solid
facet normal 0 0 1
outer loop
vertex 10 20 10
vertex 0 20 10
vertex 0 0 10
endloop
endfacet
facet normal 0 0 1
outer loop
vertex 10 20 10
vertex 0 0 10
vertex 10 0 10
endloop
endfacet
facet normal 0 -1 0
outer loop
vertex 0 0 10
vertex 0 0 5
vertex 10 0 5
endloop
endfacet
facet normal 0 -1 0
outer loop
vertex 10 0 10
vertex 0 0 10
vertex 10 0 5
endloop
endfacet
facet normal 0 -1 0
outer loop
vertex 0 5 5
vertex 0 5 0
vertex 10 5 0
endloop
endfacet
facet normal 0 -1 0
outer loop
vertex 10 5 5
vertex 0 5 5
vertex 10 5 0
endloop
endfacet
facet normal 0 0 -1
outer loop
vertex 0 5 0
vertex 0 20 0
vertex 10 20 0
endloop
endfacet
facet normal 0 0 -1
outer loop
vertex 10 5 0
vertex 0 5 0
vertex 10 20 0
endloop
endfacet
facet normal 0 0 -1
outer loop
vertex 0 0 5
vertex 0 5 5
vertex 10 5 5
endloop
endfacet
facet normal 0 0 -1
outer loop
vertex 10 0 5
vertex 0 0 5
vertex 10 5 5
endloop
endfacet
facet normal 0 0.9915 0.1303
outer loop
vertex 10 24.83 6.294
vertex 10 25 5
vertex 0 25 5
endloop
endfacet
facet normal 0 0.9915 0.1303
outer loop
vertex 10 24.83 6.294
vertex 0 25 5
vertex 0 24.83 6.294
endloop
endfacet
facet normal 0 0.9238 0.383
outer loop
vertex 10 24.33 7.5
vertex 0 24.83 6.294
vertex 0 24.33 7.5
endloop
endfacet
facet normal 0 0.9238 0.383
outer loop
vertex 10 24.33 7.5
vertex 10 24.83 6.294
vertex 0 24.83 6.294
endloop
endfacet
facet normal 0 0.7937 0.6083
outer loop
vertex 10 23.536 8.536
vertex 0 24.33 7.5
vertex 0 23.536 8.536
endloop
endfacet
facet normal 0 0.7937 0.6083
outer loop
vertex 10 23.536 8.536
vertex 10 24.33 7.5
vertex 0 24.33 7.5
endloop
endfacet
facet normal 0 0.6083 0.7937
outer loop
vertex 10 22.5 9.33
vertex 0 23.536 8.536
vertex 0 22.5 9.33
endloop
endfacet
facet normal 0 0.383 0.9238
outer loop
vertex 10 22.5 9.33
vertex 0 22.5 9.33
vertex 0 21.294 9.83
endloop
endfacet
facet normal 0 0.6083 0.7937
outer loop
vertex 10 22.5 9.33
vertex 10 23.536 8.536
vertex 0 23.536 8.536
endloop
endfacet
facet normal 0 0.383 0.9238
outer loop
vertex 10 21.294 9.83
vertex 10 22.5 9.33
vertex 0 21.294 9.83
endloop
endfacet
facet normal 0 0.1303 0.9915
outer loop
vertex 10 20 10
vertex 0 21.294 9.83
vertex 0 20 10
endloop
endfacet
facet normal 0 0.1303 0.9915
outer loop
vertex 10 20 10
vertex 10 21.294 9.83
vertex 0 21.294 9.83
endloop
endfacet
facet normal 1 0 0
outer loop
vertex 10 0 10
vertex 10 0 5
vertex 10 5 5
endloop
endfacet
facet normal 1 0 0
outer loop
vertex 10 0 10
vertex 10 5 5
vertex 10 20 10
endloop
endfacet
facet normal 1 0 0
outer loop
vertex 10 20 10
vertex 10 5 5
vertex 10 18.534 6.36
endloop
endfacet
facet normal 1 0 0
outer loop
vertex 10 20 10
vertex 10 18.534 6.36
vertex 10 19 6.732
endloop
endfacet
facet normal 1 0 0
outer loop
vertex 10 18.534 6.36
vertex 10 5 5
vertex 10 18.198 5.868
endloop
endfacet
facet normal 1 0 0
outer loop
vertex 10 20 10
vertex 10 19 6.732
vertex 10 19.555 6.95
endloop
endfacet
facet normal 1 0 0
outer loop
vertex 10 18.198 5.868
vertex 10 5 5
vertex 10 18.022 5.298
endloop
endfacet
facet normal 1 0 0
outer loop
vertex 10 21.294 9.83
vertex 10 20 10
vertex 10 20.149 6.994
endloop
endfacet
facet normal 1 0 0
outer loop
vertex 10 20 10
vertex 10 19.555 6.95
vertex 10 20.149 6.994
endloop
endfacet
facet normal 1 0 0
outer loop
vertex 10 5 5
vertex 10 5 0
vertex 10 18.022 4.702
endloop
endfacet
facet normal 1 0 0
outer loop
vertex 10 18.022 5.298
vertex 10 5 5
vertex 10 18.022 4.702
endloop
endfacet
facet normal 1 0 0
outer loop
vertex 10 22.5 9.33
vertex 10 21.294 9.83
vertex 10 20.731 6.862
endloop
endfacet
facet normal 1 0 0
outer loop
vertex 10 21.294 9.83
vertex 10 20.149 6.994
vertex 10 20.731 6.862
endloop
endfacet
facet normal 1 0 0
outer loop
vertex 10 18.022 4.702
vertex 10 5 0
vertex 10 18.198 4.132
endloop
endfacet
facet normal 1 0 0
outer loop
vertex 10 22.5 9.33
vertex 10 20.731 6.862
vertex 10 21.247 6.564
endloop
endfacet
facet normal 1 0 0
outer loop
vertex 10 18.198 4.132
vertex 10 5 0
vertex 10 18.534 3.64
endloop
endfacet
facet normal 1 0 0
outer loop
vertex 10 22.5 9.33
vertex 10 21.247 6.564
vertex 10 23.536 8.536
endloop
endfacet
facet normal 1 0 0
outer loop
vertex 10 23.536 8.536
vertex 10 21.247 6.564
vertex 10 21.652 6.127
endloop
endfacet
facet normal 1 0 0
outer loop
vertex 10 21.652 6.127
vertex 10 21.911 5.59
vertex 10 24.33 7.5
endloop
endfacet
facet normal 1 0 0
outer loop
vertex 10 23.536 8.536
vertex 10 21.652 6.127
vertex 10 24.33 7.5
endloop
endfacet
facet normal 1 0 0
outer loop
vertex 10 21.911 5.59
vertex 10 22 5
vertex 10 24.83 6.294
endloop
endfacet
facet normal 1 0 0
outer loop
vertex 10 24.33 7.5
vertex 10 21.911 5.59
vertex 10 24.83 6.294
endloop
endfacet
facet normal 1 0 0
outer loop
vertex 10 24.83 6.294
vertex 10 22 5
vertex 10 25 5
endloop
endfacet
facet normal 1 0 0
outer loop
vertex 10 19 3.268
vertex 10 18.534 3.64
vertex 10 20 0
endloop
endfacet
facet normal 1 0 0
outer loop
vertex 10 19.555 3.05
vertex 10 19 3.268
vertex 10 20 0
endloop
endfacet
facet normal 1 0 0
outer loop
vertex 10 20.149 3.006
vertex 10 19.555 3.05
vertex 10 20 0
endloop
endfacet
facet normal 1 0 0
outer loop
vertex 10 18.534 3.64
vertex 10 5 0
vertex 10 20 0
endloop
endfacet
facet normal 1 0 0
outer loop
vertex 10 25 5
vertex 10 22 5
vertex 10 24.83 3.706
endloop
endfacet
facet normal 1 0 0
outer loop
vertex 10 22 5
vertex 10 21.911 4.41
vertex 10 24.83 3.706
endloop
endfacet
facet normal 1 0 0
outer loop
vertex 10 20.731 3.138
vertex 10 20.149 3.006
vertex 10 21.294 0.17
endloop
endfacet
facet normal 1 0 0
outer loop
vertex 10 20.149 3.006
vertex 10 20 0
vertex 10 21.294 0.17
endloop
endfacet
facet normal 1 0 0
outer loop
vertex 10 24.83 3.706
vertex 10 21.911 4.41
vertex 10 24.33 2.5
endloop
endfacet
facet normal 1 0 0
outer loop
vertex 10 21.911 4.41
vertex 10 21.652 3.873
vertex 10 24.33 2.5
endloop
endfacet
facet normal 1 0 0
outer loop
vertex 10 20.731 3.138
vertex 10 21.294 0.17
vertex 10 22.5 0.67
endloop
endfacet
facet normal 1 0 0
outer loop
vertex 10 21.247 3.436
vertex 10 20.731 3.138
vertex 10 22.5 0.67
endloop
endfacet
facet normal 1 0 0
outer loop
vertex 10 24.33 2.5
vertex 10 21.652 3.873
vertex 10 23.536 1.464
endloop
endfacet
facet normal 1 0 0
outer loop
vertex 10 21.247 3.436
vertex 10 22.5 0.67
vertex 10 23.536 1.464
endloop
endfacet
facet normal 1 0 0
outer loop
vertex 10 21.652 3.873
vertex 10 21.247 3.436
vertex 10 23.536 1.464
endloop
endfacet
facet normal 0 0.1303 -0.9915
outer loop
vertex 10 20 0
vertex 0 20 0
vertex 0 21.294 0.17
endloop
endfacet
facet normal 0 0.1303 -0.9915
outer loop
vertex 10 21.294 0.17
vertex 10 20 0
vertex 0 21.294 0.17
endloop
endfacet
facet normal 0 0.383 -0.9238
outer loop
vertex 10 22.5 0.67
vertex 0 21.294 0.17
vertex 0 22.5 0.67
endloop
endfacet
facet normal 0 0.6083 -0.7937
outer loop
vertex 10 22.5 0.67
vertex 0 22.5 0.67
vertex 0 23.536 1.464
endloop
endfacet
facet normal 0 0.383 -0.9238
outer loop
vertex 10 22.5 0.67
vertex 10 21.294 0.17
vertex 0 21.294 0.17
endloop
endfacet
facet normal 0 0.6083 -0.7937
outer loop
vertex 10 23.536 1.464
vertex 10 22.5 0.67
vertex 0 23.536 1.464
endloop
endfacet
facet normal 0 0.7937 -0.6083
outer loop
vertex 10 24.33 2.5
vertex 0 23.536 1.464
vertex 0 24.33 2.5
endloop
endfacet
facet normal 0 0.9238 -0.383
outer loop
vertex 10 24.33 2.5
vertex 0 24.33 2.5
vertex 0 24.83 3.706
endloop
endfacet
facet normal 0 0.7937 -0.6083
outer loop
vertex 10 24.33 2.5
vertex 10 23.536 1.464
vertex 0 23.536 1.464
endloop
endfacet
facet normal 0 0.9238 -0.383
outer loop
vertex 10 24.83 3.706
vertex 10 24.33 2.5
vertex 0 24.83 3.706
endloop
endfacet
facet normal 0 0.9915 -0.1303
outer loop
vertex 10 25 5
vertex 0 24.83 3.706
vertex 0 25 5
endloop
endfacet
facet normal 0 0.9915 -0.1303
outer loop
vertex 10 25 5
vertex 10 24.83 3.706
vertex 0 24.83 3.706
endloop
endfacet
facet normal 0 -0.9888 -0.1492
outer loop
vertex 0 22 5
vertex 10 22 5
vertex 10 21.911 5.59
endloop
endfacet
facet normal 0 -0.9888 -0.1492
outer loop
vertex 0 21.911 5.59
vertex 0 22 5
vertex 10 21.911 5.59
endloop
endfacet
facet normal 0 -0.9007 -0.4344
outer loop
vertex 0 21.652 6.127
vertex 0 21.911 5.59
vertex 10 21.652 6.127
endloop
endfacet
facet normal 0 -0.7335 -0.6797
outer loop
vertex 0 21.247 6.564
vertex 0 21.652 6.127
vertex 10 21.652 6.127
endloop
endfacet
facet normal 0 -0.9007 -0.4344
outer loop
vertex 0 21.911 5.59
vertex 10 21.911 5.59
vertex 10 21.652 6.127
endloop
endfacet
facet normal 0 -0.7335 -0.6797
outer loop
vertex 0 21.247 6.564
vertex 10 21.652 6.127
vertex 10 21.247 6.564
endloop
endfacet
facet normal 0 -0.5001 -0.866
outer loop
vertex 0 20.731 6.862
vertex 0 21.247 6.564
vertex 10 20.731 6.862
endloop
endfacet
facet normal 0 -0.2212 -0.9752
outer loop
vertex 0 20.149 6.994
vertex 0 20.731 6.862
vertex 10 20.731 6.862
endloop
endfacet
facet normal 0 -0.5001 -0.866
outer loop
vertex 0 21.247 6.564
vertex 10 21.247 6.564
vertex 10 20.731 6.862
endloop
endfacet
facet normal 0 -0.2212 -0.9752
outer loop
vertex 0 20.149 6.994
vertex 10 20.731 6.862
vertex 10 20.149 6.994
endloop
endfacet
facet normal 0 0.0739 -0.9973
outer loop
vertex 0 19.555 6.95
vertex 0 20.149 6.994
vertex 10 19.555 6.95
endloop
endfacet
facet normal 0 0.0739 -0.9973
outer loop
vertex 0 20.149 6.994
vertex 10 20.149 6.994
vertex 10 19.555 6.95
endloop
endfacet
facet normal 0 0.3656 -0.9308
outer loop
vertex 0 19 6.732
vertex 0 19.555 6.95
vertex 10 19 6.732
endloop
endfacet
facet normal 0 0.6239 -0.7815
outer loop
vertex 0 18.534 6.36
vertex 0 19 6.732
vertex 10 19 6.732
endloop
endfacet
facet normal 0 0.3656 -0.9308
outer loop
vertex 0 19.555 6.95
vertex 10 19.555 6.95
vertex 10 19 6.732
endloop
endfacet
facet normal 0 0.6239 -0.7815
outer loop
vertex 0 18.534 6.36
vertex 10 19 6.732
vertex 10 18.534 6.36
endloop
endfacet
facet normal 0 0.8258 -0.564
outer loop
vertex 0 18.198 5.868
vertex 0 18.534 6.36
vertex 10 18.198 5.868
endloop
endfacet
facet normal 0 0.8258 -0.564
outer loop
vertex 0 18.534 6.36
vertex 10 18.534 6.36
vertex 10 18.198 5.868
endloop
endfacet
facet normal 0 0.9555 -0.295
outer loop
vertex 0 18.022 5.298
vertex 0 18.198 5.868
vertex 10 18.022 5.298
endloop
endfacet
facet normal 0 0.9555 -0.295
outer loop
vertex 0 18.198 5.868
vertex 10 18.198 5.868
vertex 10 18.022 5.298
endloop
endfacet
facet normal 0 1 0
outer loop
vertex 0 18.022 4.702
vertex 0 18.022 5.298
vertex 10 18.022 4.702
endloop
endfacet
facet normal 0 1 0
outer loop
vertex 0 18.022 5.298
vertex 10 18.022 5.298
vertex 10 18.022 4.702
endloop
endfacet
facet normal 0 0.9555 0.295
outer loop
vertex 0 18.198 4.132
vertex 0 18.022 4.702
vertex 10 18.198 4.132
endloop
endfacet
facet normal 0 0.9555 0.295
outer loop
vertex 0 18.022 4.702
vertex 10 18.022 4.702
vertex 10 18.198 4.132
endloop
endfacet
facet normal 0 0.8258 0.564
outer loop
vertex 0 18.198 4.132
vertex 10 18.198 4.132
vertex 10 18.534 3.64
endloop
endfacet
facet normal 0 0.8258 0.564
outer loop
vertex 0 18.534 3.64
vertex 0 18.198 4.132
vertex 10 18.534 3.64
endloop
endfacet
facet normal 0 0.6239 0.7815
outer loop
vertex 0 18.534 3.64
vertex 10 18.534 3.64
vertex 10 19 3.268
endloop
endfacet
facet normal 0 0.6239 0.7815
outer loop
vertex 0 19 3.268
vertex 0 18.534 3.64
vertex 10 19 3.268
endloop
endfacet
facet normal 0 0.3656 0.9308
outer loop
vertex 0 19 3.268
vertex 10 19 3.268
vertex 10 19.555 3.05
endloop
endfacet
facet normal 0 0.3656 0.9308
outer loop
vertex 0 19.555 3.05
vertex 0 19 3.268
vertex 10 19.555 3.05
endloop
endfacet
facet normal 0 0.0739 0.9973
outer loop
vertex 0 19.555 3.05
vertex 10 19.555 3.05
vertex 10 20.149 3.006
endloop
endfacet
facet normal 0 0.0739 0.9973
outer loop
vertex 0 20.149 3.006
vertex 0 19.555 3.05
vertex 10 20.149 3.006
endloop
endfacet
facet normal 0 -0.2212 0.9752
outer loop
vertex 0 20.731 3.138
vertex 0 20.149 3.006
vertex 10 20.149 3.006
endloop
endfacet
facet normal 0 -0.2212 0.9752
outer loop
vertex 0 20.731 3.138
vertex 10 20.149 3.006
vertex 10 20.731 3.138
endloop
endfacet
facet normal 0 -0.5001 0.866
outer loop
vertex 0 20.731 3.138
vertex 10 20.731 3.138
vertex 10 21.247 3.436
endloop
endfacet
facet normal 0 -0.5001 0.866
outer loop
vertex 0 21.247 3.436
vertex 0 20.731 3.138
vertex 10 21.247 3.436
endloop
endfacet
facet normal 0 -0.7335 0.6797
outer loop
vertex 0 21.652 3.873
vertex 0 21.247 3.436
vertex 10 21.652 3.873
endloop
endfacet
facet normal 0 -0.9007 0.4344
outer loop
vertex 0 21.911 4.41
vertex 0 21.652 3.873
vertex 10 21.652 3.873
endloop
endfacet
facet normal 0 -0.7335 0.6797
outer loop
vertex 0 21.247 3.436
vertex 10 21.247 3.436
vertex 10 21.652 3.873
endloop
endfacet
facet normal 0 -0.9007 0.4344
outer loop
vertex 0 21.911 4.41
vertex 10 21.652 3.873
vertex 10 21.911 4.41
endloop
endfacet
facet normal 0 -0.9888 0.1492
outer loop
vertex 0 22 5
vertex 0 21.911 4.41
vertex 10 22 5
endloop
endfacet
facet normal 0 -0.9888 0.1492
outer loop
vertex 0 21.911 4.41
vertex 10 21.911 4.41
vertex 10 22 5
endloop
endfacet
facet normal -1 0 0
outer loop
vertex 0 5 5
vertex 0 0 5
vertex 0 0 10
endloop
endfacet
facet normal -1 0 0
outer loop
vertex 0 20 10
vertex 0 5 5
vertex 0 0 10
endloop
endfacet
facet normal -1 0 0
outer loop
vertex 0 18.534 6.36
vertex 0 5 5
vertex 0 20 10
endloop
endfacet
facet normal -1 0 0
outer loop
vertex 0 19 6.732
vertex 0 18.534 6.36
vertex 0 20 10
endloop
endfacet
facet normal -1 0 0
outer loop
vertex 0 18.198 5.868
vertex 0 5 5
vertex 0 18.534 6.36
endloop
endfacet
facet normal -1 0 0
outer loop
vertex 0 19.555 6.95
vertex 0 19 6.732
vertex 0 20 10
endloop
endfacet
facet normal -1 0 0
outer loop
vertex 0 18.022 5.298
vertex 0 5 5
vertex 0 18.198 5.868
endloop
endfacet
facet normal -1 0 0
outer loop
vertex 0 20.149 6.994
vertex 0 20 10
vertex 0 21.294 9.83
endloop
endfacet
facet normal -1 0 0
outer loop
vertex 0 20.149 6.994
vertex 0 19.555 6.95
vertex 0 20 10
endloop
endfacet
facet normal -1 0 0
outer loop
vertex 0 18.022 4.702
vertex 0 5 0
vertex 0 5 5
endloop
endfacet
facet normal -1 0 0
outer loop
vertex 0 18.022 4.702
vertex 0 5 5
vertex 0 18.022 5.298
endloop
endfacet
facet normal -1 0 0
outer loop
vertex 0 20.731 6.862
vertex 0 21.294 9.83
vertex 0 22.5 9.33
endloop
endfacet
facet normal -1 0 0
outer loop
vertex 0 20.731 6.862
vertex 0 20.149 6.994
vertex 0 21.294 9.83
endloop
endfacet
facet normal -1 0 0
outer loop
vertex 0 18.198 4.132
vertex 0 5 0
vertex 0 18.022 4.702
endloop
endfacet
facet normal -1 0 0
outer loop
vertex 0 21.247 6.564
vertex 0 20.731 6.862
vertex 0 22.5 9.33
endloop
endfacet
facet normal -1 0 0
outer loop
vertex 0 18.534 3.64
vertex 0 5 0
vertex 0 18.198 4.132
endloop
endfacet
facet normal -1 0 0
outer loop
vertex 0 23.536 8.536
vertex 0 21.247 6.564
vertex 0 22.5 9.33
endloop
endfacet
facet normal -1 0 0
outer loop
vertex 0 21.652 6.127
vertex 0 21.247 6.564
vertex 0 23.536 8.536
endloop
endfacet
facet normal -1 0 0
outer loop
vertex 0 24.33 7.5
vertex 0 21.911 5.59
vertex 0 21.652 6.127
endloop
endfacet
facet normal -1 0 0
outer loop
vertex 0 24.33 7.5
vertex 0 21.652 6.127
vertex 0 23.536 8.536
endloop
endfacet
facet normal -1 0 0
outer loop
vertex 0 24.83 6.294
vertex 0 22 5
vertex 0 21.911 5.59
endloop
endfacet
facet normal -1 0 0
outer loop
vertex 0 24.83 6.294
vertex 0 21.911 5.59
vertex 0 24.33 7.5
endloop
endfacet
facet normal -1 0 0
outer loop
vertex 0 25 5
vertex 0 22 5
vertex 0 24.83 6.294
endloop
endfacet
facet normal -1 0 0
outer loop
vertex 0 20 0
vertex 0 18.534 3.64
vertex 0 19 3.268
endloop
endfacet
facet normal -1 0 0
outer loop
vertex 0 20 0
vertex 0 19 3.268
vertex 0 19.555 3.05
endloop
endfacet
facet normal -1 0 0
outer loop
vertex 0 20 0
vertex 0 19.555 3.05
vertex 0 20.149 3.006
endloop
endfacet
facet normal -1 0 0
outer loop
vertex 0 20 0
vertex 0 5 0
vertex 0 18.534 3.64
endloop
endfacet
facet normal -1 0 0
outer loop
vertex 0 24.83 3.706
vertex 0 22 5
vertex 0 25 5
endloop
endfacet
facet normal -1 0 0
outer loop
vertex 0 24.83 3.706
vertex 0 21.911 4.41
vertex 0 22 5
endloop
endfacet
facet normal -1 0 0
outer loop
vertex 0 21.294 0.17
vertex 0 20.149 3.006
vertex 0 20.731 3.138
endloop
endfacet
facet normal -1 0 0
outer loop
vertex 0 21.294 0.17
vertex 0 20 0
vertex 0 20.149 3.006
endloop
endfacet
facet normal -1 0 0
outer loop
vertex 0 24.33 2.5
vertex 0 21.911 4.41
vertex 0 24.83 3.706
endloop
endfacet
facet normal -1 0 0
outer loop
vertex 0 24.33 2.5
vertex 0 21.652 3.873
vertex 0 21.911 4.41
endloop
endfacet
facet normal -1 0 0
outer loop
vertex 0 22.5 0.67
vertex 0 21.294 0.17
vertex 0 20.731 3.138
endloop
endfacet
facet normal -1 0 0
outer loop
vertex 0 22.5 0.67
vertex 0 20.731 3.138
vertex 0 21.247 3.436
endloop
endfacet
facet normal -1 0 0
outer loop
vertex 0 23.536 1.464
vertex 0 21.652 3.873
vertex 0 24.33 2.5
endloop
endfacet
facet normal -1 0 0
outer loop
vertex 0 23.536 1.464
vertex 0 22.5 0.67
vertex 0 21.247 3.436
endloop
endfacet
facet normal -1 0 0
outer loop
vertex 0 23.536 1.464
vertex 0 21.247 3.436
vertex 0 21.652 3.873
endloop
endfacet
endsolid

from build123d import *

# Parameters (mm, degrees)
SKETCH_W     = 10
SKETCH_H     = 20
PAD_DEPTH    = 5
SKETCH001_W  = 10
SKETCH001_H  = 25
PAD001_DEPTH = 5
SKETCH002_R  = 2
POCKET_DEPTH = 10


with BuildPart() as part:
    # Sketch → Pad (new body)
    with BuildSketch(Plane.XY):
        with Locations((5, 15)):
            Rectangle(SKETCH_W, SKETCH_H)
    extrude(amount=PAD_DEPTH)

    # Sketch001 → Pad001 (new body)
    with BuildSketch(Plane.XY.offset(5)):
        with Locations((5, 12.5)):
            Rectangle(SKETCH001_W, SKETCH001_H)
    extrude(amount=PAD001_DEPTH)

    # Sketch002 → Pocket (cut)
    with BuildSketch(Plane.YZ.offset(10)):
        with Locations((20, 5)):
            Circle(SKETCH002_R)
        with BuildLine():
            ThreePointArc((25, 5), (23.535534, 8.535534), (20, 10))
            Line((20, 10), (25, 10))
            Line((25, 10), (25, 5))
        make_face()
        with BuildLine():
            ThreePointArc((20.00002, 0), (23.535546, 1.464468), (25, 5))
            Line((25, 0), (25, 5))
            Line((20.00002, 0), (25, 0))
        make_face()
    extrude(amount=-POCKET_DEPTH, mode=Mode.SUBTRACT)


solid = part.part
